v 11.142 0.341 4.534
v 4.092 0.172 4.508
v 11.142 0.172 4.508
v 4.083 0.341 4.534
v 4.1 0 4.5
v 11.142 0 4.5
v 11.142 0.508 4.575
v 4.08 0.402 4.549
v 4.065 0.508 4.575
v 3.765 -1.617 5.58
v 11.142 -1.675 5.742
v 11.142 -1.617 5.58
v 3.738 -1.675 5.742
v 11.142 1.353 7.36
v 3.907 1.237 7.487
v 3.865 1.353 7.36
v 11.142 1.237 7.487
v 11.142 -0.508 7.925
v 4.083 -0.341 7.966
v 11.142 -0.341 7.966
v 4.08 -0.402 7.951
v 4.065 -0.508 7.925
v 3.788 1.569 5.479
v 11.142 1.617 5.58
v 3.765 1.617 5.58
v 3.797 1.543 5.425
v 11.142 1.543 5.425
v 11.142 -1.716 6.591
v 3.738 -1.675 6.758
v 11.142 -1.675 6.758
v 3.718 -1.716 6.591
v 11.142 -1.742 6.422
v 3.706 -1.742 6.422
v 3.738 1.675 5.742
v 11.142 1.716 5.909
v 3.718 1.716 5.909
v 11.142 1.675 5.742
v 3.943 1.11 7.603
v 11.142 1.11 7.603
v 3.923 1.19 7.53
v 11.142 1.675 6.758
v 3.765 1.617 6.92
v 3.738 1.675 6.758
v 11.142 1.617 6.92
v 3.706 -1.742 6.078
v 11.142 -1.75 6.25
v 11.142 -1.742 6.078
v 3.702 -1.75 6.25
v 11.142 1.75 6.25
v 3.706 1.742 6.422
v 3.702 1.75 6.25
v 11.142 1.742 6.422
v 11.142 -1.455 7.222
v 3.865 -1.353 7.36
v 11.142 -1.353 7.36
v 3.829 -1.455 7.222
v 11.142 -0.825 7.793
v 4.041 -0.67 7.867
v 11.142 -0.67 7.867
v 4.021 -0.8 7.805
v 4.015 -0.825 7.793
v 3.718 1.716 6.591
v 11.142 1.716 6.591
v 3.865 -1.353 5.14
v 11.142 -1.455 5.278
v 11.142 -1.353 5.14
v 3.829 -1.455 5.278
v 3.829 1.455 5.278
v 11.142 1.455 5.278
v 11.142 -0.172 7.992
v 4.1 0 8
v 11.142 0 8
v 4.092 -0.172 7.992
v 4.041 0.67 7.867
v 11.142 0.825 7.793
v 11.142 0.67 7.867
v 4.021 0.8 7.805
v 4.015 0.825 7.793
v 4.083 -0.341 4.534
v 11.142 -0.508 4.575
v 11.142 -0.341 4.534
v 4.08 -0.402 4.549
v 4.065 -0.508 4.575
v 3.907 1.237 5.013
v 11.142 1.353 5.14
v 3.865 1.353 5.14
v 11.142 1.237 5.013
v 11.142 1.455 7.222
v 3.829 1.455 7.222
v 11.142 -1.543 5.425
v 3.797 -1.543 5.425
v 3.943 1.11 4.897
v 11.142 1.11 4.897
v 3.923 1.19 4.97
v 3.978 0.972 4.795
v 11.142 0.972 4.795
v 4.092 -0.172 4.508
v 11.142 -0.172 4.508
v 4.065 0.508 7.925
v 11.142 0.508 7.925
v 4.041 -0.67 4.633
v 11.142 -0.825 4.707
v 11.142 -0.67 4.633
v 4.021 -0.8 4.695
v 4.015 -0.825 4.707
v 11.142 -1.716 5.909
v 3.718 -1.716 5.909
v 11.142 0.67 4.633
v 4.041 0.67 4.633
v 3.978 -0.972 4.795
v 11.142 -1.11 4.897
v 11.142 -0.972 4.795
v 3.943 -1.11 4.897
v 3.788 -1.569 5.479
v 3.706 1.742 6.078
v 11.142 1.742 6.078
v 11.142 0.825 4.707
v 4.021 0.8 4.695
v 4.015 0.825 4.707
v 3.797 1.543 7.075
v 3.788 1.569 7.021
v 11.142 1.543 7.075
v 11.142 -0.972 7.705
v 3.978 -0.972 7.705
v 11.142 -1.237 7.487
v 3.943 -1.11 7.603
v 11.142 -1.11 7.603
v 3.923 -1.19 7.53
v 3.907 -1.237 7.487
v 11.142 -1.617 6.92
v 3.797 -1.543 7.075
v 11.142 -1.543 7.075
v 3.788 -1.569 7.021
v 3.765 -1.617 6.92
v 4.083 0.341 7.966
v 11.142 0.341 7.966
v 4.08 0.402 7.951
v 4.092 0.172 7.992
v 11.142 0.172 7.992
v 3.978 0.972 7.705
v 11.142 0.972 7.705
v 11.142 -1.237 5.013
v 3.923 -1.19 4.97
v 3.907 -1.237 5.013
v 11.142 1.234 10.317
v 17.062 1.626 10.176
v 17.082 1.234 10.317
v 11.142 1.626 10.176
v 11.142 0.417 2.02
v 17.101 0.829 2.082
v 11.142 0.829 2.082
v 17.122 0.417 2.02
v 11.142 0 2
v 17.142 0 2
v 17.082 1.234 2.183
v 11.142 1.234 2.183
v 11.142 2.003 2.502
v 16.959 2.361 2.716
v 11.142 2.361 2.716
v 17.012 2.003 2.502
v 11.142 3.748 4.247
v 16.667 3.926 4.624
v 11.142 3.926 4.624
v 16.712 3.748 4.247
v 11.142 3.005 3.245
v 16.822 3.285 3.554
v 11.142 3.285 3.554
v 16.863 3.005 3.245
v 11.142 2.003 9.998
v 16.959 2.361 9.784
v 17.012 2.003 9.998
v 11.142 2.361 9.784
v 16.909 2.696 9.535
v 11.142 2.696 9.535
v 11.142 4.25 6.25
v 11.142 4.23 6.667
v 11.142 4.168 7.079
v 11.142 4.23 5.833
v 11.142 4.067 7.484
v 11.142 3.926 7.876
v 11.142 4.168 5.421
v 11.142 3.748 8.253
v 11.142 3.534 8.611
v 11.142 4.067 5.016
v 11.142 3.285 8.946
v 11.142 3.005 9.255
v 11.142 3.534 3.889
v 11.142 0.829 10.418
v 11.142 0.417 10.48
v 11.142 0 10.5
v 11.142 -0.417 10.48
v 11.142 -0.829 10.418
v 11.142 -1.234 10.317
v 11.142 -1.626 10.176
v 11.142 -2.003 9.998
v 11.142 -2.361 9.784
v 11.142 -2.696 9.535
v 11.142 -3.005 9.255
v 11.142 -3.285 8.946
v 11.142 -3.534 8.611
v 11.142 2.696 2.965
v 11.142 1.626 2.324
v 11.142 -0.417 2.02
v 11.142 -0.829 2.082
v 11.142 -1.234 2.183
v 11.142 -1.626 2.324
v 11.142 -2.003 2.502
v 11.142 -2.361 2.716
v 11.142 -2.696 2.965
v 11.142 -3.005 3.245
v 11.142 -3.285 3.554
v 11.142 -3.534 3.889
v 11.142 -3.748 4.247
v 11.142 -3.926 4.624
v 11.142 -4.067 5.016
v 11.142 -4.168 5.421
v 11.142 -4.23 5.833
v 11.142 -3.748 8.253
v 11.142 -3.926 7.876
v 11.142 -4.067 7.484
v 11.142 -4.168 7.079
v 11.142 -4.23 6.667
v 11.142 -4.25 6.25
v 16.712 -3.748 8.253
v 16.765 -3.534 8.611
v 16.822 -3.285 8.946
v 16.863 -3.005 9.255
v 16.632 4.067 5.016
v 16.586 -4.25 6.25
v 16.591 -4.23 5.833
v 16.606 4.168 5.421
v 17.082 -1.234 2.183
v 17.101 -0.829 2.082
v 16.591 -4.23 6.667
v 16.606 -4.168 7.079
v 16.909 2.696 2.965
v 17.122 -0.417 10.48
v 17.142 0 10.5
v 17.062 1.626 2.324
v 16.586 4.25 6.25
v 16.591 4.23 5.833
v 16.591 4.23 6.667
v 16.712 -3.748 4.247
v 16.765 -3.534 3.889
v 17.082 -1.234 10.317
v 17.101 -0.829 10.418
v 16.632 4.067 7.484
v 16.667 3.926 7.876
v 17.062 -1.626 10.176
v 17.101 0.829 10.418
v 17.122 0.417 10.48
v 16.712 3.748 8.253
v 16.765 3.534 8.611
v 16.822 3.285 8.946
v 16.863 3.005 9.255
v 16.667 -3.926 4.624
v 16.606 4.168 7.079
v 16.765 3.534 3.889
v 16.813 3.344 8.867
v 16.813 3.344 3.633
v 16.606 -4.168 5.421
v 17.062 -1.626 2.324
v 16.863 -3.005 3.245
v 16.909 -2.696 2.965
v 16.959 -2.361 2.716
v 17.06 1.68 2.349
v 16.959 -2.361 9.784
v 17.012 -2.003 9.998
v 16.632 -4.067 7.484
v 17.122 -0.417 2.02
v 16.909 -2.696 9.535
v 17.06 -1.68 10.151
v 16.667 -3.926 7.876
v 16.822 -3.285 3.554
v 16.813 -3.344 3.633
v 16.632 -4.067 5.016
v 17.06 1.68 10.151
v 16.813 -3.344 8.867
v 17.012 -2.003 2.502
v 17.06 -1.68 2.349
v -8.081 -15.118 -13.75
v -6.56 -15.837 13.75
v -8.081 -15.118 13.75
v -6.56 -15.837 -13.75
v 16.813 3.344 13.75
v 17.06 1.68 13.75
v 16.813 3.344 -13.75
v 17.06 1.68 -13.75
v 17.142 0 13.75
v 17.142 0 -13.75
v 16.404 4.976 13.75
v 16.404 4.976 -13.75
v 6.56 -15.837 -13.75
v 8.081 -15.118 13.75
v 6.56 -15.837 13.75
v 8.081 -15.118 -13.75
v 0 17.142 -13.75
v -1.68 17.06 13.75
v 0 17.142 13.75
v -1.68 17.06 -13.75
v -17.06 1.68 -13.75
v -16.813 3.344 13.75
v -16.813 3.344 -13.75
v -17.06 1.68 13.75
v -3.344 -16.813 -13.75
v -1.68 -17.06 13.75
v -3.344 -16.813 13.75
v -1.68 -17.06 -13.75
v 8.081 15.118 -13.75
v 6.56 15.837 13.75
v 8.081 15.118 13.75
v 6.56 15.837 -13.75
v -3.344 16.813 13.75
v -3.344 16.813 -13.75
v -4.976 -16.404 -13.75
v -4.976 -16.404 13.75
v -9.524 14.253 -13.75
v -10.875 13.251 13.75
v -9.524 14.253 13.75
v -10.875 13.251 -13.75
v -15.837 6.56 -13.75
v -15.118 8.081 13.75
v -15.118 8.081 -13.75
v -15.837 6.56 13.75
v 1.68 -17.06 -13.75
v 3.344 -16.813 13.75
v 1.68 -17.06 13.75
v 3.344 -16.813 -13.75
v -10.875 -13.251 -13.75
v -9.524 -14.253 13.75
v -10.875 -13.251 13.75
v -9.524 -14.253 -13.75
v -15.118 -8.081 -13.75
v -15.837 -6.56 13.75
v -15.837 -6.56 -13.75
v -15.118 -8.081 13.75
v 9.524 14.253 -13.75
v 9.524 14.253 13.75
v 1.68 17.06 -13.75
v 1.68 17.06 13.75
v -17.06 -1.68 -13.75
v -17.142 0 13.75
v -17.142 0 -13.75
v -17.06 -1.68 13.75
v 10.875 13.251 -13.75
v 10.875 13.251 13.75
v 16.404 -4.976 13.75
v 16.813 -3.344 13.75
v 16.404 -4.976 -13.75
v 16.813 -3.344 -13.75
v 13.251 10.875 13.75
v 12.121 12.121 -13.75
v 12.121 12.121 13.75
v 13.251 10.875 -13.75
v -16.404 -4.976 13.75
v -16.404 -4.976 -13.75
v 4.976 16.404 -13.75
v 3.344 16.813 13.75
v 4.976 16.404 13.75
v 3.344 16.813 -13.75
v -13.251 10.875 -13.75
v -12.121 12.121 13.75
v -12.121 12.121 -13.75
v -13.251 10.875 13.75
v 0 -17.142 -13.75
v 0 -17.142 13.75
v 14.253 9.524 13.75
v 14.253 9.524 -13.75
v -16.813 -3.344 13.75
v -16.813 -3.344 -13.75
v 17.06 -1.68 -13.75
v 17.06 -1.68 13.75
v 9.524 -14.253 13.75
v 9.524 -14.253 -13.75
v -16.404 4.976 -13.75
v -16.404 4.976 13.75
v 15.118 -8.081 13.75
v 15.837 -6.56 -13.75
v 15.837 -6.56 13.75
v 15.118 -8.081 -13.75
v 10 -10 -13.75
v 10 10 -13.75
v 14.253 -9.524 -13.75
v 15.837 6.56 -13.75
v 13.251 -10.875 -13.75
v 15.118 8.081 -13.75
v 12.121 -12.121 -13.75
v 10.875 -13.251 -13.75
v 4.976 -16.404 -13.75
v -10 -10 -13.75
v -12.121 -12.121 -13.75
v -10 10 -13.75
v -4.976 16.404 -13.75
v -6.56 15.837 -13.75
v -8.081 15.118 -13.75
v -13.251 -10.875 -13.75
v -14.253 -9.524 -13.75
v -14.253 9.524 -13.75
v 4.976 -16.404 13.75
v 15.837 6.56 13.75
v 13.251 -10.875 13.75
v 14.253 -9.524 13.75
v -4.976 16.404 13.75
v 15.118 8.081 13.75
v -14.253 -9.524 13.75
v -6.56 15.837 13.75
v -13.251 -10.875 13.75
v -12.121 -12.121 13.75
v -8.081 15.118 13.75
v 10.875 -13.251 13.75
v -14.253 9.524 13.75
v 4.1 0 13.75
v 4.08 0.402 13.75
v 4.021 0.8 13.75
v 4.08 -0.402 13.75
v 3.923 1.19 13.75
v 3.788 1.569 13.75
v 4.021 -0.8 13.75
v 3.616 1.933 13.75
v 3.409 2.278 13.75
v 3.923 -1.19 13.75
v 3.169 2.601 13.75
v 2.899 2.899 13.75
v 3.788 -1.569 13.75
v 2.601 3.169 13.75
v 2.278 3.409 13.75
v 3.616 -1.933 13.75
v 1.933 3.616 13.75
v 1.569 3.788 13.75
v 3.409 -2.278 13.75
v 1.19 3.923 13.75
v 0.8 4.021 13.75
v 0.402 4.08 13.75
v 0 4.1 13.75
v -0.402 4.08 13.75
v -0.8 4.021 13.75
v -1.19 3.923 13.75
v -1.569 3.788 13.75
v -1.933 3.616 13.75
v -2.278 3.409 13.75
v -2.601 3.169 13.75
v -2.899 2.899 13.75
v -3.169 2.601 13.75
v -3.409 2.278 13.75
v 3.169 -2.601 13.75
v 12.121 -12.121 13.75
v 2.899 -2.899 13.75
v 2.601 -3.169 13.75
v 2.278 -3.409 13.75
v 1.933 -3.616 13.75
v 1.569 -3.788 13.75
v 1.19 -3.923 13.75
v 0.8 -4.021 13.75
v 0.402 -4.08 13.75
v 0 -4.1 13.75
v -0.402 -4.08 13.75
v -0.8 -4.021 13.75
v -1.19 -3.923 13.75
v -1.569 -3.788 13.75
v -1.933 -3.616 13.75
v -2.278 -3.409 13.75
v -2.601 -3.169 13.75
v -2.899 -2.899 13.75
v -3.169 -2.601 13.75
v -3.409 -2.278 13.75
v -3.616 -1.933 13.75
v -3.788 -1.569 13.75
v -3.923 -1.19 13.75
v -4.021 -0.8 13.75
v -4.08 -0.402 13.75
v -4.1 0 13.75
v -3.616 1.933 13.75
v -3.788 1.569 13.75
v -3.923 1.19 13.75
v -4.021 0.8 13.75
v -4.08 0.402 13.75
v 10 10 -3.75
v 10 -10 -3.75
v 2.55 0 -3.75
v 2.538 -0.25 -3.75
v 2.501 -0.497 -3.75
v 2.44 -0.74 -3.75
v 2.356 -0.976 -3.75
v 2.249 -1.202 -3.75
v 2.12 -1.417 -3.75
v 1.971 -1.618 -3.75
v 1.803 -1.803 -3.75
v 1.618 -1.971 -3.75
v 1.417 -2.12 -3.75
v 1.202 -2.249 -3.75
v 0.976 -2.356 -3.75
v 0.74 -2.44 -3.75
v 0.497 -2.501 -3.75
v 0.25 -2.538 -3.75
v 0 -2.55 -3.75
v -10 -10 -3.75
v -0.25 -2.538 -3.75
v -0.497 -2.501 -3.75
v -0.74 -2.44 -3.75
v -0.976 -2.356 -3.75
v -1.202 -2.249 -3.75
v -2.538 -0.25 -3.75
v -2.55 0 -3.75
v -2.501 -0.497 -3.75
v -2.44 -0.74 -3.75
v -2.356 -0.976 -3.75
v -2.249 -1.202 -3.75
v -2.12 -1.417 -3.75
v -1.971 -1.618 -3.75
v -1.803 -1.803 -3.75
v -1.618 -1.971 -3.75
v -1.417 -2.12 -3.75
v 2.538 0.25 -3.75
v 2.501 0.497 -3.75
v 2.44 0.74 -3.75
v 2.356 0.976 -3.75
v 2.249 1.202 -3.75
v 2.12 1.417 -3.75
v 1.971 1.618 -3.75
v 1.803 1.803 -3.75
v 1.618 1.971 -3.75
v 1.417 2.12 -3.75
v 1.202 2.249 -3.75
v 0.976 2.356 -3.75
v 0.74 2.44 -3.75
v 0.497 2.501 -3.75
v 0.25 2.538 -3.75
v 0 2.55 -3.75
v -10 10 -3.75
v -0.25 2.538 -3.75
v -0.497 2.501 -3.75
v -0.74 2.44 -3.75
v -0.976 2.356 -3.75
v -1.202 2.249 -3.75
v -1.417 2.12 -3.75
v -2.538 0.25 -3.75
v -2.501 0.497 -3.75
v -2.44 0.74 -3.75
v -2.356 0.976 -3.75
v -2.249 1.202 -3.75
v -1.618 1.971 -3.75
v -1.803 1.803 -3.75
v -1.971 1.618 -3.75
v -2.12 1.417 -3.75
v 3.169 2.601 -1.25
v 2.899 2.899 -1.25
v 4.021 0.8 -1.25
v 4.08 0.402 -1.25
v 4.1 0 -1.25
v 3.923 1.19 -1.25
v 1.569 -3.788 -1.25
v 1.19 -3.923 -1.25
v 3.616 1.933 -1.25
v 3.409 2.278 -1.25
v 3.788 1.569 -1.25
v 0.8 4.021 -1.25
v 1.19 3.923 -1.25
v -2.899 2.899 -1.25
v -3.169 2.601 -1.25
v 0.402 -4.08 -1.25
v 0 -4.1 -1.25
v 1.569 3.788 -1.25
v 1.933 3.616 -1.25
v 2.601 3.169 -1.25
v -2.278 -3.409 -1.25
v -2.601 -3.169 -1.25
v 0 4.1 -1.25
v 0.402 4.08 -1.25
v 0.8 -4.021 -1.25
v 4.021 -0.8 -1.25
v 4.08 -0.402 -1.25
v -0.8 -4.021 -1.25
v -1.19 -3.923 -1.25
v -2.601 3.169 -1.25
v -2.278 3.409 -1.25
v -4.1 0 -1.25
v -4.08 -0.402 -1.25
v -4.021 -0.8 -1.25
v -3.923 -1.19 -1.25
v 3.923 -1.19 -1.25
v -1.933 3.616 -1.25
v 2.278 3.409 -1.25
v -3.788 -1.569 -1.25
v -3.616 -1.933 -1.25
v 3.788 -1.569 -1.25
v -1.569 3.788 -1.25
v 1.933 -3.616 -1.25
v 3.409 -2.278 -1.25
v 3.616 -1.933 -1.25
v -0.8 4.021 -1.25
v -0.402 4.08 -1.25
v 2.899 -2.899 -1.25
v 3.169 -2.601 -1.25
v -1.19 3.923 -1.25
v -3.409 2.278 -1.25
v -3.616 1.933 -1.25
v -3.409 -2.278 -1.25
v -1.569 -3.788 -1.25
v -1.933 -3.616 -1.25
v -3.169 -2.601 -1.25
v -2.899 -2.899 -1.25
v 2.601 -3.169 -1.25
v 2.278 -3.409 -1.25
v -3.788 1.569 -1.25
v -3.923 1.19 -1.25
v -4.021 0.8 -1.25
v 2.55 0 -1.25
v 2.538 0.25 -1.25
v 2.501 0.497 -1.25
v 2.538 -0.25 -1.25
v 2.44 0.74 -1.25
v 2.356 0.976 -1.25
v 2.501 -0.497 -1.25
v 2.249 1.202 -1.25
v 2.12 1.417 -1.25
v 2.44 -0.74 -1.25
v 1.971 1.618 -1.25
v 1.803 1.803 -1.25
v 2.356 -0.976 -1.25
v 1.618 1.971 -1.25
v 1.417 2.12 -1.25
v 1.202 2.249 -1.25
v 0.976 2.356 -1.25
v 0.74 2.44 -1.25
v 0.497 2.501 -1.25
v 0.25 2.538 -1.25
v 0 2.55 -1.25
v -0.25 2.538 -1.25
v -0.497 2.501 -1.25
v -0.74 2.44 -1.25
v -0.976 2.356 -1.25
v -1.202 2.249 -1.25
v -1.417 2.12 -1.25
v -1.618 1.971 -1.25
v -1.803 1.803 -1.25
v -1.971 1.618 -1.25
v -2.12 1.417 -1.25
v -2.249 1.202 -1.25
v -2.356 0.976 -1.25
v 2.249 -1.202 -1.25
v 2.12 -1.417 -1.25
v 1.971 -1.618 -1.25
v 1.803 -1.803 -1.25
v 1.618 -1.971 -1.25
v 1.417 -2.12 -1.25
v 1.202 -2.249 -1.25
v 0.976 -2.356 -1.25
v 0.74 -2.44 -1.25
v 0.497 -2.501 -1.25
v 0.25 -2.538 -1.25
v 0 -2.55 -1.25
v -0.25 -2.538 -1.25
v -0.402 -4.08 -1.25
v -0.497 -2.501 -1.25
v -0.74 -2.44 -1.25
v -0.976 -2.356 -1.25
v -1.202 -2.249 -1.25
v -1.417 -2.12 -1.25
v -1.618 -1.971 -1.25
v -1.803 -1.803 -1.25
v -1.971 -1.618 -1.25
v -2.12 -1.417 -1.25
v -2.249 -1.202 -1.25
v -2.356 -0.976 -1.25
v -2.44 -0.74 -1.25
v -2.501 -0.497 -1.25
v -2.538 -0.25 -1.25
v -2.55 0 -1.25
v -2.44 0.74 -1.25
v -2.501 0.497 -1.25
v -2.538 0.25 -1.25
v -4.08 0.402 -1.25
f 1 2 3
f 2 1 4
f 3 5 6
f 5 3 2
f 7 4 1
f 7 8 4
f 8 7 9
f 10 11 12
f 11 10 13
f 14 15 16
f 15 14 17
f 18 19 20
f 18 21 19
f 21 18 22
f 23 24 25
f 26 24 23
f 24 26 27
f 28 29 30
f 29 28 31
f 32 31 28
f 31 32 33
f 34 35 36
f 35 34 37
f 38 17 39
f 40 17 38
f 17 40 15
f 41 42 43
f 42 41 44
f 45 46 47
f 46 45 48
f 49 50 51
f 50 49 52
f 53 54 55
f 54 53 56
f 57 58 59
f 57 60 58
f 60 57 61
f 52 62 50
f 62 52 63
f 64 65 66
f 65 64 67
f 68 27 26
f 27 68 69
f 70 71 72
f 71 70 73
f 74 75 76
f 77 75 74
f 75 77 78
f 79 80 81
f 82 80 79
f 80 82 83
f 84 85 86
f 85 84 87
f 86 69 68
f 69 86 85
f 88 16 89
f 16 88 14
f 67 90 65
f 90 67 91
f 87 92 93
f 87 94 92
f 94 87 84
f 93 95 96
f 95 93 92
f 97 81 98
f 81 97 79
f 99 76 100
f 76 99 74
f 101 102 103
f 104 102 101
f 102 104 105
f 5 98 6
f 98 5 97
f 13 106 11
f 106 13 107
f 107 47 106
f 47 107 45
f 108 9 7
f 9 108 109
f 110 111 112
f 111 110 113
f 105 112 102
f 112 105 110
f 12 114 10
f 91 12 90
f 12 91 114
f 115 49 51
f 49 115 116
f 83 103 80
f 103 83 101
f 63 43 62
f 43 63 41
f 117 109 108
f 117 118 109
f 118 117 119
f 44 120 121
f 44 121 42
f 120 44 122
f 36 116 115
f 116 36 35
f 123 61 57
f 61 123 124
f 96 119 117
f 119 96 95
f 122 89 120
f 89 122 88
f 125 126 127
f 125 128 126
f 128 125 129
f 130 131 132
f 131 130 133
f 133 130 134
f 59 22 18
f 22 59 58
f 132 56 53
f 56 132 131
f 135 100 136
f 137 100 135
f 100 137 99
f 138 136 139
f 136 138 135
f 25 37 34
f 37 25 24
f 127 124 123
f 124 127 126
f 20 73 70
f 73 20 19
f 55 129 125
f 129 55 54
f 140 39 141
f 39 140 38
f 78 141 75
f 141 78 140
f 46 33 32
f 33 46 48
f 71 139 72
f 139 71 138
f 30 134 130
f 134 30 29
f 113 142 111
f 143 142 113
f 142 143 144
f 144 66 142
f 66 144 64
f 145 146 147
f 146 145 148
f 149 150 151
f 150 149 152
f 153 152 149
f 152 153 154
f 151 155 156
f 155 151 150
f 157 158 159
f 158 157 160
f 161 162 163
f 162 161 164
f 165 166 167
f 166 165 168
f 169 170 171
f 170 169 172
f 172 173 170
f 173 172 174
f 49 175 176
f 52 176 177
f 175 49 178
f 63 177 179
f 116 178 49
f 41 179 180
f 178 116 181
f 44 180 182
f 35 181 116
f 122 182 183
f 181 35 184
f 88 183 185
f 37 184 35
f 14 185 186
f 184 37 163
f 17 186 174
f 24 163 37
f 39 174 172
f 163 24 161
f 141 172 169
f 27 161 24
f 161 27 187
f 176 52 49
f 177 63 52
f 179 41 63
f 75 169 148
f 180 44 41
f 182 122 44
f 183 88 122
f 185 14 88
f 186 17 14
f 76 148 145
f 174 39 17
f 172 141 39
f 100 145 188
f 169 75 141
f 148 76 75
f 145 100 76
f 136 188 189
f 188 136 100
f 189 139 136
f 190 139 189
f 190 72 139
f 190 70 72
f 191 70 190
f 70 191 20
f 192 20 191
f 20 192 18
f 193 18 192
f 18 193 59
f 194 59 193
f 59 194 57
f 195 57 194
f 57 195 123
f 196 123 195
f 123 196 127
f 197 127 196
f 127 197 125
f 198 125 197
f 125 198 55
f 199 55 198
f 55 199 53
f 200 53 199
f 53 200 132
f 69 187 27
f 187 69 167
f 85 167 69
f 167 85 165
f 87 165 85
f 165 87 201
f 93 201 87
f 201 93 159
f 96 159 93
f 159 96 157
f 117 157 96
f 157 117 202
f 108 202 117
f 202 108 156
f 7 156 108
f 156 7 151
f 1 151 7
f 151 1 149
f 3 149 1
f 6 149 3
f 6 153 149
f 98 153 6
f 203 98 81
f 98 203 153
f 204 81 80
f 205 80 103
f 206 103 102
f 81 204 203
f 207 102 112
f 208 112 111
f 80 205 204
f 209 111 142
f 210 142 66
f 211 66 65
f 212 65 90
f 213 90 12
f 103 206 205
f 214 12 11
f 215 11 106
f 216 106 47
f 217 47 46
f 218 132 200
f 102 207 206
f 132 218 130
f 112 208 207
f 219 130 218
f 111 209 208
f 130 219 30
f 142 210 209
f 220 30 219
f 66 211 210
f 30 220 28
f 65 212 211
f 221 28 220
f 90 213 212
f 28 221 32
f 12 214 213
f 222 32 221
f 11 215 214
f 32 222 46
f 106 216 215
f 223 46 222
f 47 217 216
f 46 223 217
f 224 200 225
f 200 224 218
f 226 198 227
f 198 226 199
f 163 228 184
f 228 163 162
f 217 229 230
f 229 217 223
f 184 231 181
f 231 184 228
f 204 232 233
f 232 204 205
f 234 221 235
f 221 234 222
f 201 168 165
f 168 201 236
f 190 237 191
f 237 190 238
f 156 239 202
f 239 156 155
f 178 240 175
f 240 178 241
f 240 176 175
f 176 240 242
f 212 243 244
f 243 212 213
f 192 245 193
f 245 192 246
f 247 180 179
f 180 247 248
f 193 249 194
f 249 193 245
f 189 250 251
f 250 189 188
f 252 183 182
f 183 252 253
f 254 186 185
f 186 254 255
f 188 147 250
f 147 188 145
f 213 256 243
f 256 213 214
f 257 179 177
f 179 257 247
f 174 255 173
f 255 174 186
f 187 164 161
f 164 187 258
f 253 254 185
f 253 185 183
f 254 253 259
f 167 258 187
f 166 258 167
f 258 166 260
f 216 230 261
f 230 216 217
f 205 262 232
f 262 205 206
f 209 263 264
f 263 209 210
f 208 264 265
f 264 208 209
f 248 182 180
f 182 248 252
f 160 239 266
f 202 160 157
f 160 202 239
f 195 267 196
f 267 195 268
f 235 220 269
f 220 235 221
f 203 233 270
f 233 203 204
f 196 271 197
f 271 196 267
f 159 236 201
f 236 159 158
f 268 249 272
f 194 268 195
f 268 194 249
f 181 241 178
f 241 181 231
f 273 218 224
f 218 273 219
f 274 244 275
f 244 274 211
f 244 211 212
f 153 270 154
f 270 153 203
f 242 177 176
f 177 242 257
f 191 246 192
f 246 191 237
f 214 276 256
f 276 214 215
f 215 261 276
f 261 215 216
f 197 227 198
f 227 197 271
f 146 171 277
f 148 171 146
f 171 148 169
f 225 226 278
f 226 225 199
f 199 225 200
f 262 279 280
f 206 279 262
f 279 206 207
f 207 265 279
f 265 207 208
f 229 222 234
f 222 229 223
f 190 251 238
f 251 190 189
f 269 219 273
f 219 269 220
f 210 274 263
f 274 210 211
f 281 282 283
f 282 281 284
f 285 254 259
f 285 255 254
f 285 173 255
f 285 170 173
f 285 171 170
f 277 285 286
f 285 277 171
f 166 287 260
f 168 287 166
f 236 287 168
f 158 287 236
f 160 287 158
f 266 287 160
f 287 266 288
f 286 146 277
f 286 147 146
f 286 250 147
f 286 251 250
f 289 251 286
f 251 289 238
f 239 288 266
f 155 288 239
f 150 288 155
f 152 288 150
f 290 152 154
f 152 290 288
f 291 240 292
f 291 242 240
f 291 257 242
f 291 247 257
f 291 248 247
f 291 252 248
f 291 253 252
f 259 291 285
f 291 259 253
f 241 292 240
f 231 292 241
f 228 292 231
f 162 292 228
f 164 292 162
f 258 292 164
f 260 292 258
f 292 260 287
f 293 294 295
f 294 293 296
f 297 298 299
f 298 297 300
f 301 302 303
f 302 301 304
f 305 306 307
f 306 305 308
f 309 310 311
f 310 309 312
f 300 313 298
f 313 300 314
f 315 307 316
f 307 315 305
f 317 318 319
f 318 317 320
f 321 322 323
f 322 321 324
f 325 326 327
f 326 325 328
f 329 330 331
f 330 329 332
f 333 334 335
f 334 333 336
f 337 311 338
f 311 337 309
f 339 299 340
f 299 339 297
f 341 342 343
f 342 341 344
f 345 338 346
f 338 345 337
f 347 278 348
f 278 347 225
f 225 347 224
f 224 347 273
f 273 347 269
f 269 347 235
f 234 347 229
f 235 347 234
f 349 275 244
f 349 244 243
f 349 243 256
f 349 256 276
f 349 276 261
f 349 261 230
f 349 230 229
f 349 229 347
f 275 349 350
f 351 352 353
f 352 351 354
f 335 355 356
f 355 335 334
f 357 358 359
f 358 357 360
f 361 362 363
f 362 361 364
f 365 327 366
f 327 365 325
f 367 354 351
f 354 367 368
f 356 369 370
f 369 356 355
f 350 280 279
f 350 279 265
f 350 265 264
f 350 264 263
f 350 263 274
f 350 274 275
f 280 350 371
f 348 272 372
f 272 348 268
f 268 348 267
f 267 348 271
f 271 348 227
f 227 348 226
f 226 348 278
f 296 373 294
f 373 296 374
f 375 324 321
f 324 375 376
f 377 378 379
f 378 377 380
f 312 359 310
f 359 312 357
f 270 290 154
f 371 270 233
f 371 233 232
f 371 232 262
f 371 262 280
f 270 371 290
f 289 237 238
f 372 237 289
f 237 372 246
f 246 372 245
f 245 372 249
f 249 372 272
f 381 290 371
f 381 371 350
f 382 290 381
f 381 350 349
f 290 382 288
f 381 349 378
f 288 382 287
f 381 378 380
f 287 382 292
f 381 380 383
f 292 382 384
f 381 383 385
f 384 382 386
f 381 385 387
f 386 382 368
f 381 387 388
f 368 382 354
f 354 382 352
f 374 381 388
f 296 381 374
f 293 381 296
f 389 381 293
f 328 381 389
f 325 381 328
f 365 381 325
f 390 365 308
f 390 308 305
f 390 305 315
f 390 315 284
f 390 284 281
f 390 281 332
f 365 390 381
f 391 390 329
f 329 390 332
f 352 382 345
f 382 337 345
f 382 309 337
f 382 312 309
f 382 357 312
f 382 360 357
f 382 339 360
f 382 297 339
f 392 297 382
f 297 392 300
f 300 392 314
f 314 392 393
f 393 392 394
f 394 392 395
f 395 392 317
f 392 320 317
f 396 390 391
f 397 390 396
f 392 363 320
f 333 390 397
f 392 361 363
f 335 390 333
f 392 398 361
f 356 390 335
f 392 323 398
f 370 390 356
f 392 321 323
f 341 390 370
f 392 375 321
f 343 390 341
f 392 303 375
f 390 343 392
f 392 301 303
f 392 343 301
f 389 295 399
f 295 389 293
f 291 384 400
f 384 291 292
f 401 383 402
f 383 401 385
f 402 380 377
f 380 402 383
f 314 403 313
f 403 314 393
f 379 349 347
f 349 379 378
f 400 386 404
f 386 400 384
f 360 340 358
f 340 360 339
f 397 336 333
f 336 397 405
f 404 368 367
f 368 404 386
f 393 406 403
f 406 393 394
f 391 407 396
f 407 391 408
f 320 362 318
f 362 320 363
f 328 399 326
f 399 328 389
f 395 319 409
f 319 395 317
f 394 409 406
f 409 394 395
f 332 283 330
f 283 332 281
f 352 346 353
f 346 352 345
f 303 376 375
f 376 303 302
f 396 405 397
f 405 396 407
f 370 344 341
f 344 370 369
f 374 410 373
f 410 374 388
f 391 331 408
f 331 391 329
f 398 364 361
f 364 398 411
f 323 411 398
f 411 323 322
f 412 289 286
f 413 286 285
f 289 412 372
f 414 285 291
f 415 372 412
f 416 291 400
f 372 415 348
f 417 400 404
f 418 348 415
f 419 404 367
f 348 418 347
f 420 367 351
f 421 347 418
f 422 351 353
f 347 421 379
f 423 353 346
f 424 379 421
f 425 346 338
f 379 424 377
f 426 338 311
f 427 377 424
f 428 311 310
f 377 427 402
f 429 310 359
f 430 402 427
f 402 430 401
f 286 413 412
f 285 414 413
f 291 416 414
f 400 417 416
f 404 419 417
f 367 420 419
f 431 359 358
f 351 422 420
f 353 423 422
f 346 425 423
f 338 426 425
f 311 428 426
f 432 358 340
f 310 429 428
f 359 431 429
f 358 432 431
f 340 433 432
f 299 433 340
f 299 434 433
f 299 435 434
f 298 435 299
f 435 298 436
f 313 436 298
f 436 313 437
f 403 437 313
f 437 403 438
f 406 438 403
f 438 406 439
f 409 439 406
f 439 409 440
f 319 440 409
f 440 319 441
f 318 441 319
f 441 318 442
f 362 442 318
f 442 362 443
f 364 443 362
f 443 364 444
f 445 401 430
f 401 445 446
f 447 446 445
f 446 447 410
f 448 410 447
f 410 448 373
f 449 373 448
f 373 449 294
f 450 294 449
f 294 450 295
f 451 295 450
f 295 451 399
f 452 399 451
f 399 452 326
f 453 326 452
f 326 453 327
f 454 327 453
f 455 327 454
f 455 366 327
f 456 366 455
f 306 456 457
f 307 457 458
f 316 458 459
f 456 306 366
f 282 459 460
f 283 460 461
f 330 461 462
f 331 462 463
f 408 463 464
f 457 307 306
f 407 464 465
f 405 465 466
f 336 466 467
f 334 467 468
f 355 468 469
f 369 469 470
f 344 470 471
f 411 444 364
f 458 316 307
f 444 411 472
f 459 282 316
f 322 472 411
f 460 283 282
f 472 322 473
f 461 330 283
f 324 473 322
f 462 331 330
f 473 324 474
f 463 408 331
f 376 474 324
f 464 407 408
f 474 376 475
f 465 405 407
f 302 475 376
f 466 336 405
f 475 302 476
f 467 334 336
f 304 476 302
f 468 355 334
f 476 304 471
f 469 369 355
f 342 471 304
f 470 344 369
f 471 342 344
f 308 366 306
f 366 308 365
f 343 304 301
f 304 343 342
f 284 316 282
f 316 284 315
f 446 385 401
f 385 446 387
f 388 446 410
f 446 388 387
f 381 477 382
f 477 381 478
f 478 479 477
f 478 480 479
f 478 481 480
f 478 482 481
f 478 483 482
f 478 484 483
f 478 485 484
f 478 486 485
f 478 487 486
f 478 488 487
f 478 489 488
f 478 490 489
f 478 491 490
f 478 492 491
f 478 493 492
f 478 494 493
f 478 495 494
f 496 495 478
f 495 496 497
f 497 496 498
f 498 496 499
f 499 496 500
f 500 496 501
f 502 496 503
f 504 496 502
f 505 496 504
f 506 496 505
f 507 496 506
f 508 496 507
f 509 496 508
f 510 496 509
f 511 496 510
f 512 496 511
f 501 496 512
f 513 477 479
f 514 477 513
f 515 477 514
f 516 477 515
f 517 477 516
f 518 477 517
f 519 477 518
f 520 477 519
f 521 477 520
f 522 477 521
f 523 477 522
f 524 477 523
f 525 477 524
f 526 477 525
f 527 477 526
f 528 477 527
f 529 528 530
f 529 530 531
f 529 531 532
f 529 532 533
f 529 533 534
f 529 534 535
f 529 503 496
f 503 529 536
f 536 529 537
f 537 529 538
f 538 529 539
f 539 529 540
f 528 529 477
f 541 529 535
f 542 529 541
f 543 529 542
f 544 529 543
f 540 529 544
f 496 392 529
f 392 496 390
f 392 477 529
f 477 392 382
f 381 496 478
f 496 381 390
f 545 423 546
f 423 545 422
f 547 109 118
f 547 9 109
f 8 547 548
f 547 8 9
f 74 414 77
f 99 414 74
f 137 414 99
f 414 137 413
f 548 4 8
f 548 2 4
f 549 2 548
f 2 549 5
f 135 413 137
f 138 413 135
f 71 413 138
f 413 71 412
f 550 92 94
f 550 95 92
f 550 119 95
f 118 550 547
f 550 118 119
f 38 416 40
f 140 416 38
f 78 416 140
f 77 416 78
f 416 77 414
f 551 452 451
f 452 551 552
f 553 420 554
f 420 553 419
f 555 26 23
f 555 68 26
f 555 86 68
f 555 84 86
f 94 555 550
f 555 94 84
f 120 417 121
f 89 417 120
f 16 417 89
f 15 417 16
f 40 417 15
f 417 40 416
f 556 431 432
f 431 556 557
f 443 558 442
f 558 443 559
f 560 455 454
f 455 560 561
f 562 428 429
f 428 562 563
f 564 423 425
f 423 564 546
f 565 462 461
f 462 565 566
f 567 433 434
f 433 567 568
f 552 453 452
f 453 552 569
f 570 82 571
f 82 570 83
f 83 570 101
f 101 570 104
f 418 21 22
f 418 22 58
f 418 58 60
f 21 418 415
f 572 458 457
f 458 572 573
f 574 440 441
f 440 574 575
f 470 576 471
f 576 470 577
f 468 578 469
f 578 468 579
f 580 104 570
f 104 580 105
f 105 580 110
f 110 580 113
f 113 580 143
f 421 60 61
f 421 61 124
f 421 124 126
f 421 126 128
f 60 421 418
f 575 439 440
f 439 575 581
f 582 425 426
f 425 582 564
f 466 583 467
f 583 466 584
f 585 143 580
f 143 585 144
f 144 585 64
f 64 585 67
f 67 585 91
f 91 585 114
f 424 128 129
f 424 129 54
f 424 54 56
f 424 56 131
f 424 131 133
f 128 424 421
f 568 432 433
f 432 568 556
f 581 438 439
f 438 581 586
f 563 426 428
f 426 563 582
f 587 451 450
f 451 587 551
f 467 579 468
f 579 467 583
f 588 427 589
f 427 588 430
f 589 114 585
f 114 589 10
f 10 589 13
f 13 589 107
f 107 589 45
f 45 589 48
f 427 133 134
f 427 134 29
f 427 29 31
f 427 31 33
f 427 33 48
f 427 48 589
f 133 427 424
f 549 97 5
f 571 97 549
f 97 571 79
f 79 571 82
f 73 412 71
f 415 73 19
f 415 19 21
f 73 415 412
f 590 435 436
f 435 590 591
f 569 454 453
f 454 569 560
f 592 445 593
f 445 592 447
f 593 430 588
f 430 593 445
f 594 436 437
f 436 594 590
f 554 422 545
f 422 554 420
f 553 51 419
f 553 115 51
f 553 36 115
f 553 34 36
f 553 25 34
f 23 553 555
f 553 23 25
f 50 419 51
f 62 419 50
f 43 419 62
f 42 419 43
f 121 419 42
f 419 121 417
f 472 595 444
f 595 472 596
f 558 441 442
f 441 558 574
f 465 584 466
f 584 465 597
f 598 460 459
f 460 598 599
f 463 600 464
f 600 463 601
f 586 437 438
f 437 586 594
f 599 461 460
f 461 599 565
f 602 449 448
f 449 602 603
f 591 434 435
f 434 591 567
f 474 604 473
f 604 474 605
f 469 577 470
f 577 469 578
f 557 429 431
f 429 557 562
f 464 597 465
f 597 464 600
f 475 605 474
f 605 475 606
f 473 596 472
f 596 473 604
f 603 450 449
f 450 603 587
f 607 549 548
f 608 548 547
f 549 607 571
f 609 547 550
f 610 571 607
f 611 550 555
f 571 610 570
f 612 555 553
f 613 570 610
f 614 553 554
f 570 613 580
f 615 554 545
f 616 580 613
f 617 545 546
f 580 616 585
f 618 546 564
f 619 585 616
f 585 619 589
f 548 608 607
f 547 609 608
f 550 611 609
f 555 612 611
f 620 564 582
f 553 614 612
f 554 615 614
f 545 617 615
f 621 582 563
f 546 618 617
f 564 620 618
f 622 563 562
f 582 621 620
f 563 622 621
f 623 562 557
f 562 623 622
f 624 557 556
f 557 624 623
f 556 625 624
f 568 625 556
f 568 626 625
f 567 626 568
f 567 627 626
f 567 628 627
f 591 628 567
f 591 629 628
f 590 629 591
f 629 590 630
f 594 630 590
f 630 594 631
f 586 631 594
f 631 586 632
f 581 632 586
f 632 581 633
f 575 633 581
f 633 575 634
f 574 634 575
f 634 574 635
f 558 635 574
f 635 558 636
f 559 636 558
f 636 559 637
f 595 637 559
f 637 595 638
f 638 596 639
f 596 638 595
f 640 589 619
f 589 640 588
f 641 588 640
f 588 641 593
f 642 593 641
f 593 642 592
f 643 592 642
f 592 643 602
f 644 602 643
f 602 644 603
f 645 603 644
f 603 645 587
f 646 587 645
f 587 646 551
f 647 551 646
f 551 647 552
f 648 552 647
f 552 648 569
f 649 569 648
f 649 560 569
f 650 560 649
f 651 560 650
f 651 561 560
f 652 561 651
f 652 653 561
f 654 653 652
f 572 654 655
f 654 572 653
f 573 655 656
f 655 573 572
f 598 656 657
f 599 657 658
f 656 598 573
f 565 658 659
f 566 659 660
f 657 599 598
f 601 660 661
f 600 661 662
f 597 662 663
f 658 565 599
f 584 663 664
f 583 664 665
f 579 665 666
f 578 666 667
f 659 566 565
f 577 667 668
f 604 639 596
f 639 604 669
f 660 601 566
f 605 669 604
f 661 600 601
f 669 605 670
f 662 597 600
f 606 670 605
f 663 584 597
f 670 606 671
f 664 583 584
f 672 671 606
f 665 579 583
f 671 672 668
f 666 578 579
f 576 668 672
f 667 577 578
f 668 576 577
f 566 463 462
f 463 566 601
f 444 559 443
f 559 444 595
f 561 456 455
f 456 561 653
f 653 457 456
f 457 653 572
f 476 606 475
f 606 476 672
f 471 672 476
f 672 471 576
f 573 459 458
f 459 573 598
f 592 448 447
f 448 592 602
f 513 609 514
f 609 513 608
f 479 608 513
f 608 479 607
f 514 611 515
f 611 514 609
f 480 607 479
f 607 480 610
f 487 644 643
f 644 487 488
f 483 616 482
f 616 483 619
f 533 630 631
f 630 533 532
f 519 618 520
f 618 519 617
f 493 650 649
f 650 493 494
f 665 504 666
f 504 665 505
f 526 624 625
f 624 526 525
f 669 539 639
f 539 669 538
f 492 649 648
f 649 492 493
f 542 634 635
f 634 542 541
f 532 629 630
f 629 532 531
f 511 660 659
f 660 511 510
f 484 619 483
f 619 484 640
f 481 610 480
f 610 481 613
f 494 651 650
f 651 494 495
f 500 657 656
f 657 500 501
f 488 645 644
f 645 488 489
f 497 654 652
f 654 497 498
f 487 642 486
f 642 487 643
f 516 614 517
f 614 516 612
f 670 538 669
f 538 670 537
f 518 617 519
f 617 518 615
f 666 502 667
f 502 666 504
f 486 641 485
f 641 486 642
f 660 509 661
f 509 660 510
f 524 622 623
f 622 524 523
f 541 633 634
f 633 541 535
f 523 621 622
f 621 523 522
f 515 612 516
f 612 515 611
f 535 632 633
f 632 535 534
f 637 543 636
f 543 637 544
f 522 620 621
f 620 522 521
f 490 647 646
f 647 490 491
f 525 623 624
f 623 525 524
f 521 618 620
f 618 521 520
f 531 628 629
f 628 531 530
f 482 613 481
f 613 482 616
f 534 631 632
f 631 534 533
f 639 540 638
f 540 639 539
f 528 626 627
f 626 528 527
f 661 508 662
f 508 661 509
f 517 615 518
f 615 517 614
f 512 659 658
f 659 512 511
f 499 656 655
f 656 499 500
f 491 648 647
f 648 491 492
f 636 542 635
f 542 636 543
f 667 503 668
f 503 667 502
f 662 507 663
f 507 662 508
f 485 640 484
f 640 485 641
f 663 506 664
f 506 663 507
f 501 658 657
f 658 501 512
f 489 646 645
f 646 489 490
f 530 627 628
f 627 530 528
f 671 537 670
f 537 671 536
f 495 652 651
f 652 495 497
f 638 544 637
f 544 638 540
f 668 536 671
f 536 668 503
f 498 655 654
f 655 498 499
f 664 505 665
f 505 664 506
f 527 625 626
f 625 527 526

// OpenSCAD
// ====================================================================
// 2020 T-Slot Extrusion to 8mm Metal Rod End-Mount Adapter (Cylindrical)
// ====================================================================
$fn = 64; // High resolution for smooth holes

// --- Parametric Dimensions ---
tslot_size             = 20.0; // Standard 2020 profile width (20mm)
tslot_clearance        = 0.0;  // Print tolerance for 2020 fit (+0.2mm)
socket_depth           = 10.0; // Depth of sleeve wrapping around 2020 end (20mm)

rod_diam               = 8.0;  // Metal rod diameter (8mm)
rod_clearance          = 0.1;  // Print tolerance for rod fit (+0.2mm)
rod_socket_depth       = 15.0; // Insertion depth for the 8mm rod (25mm)

wall_thickness         = 3.0;  // Wall thickness at thinnest point (3.5mm)
partition_thick        = 2.5;  // Divider thickness between 2020 end and rod (5.0mm)

m5_bolt_diam           = 5.1;  // Center hole diameter for M5 bolt into 2020 end (5.3mm)
m3_tslot_setscrew_diam = 0.0;  // Set-screw hole to clamp 2020 extrusion (3.0mm)

// --- M4 Rod Set-Screw & Countersink Parameters ---
m4_rod_tap_diam        = 3.5;  // M4 tap hole diameter for threading into plastic (3.5mm)
m4_cs_diam             = 8.5;  // Recess diameter for M4 screw head (8.5mm)
m4_cs_depth            = 6.0;  // Countersink depth from outer cylinder surface (6.0mm)

// --- Derived Dimensions ---
tslot_width  = tslot_size + (tslot_clearance * 2);
outer_diam   = sqrt(2 * pow(tslot_width, 2)) + (wall_thickness * 2); 
total_length = socket_depth + partition_thick + rod_socket_depth;

// --- Main Part Generation ---
difference() {
    // 1. Solid Outer Cylinder Shell
    cylinder(d = outer_diam, h = total_length, center = true);

    // 2. 2020 Extrusion Socket (Bottom)
    translate([0, 0, -total_length/2 + socket_depth/2 - 0.1])
        cube([
            tslot_width, 
            tslot_width, 
            socket_depth + 0.2
        ], center = true);

    // 3. 8mm Rod Socket (Top)
    translate([0, 0, total_length/2 - rod_socket_depth/2 + 0.1])
        cylinder(
            d = rod_diam + (rod_clearance * 2), 
            h = rod_socket_depth + 0.2, 
            center = true
        );

    // 4. Center M5 Mounting Hole (Secures adapter into 2020 end-hole)
    cylinder(d = m5_bolt_diam, h = total_length + 2, center = true);

    // 5. Top M4 Rod Set-Screw (Single-sided: Center to outer edge only)
    translate([0, 0, total_length/2 - (rod_socket_depth / 2)]) {
        rotate([0, 90, 0]) {
            // M4 Tap Hole extending from center axis out to outer wall only
            cylinder(d = m4_rod_tap_diam, h = outer_diam/2 + 1, center = false);

            // Entry-side Countersink/Counterbore for M4 screw head
            translate([0, 0, outer_diam/2 - m4_cs_depth])
                cylinder(d = m4_cs_diam, h = m4_cs_depth + 5);
        }
    }

    // 6. Bottom Side Clamping Set-Screw Hole (M3 - Clamps 2020 T-Slot)
    translate([0, 0, -total_length/2 + (socket_depth / 2)])
        rotate([0, 90, 0])
            cylinder(d = m3_tslot_setscrew_diam, h = outer_diam/2 + 2, center = false);
}
